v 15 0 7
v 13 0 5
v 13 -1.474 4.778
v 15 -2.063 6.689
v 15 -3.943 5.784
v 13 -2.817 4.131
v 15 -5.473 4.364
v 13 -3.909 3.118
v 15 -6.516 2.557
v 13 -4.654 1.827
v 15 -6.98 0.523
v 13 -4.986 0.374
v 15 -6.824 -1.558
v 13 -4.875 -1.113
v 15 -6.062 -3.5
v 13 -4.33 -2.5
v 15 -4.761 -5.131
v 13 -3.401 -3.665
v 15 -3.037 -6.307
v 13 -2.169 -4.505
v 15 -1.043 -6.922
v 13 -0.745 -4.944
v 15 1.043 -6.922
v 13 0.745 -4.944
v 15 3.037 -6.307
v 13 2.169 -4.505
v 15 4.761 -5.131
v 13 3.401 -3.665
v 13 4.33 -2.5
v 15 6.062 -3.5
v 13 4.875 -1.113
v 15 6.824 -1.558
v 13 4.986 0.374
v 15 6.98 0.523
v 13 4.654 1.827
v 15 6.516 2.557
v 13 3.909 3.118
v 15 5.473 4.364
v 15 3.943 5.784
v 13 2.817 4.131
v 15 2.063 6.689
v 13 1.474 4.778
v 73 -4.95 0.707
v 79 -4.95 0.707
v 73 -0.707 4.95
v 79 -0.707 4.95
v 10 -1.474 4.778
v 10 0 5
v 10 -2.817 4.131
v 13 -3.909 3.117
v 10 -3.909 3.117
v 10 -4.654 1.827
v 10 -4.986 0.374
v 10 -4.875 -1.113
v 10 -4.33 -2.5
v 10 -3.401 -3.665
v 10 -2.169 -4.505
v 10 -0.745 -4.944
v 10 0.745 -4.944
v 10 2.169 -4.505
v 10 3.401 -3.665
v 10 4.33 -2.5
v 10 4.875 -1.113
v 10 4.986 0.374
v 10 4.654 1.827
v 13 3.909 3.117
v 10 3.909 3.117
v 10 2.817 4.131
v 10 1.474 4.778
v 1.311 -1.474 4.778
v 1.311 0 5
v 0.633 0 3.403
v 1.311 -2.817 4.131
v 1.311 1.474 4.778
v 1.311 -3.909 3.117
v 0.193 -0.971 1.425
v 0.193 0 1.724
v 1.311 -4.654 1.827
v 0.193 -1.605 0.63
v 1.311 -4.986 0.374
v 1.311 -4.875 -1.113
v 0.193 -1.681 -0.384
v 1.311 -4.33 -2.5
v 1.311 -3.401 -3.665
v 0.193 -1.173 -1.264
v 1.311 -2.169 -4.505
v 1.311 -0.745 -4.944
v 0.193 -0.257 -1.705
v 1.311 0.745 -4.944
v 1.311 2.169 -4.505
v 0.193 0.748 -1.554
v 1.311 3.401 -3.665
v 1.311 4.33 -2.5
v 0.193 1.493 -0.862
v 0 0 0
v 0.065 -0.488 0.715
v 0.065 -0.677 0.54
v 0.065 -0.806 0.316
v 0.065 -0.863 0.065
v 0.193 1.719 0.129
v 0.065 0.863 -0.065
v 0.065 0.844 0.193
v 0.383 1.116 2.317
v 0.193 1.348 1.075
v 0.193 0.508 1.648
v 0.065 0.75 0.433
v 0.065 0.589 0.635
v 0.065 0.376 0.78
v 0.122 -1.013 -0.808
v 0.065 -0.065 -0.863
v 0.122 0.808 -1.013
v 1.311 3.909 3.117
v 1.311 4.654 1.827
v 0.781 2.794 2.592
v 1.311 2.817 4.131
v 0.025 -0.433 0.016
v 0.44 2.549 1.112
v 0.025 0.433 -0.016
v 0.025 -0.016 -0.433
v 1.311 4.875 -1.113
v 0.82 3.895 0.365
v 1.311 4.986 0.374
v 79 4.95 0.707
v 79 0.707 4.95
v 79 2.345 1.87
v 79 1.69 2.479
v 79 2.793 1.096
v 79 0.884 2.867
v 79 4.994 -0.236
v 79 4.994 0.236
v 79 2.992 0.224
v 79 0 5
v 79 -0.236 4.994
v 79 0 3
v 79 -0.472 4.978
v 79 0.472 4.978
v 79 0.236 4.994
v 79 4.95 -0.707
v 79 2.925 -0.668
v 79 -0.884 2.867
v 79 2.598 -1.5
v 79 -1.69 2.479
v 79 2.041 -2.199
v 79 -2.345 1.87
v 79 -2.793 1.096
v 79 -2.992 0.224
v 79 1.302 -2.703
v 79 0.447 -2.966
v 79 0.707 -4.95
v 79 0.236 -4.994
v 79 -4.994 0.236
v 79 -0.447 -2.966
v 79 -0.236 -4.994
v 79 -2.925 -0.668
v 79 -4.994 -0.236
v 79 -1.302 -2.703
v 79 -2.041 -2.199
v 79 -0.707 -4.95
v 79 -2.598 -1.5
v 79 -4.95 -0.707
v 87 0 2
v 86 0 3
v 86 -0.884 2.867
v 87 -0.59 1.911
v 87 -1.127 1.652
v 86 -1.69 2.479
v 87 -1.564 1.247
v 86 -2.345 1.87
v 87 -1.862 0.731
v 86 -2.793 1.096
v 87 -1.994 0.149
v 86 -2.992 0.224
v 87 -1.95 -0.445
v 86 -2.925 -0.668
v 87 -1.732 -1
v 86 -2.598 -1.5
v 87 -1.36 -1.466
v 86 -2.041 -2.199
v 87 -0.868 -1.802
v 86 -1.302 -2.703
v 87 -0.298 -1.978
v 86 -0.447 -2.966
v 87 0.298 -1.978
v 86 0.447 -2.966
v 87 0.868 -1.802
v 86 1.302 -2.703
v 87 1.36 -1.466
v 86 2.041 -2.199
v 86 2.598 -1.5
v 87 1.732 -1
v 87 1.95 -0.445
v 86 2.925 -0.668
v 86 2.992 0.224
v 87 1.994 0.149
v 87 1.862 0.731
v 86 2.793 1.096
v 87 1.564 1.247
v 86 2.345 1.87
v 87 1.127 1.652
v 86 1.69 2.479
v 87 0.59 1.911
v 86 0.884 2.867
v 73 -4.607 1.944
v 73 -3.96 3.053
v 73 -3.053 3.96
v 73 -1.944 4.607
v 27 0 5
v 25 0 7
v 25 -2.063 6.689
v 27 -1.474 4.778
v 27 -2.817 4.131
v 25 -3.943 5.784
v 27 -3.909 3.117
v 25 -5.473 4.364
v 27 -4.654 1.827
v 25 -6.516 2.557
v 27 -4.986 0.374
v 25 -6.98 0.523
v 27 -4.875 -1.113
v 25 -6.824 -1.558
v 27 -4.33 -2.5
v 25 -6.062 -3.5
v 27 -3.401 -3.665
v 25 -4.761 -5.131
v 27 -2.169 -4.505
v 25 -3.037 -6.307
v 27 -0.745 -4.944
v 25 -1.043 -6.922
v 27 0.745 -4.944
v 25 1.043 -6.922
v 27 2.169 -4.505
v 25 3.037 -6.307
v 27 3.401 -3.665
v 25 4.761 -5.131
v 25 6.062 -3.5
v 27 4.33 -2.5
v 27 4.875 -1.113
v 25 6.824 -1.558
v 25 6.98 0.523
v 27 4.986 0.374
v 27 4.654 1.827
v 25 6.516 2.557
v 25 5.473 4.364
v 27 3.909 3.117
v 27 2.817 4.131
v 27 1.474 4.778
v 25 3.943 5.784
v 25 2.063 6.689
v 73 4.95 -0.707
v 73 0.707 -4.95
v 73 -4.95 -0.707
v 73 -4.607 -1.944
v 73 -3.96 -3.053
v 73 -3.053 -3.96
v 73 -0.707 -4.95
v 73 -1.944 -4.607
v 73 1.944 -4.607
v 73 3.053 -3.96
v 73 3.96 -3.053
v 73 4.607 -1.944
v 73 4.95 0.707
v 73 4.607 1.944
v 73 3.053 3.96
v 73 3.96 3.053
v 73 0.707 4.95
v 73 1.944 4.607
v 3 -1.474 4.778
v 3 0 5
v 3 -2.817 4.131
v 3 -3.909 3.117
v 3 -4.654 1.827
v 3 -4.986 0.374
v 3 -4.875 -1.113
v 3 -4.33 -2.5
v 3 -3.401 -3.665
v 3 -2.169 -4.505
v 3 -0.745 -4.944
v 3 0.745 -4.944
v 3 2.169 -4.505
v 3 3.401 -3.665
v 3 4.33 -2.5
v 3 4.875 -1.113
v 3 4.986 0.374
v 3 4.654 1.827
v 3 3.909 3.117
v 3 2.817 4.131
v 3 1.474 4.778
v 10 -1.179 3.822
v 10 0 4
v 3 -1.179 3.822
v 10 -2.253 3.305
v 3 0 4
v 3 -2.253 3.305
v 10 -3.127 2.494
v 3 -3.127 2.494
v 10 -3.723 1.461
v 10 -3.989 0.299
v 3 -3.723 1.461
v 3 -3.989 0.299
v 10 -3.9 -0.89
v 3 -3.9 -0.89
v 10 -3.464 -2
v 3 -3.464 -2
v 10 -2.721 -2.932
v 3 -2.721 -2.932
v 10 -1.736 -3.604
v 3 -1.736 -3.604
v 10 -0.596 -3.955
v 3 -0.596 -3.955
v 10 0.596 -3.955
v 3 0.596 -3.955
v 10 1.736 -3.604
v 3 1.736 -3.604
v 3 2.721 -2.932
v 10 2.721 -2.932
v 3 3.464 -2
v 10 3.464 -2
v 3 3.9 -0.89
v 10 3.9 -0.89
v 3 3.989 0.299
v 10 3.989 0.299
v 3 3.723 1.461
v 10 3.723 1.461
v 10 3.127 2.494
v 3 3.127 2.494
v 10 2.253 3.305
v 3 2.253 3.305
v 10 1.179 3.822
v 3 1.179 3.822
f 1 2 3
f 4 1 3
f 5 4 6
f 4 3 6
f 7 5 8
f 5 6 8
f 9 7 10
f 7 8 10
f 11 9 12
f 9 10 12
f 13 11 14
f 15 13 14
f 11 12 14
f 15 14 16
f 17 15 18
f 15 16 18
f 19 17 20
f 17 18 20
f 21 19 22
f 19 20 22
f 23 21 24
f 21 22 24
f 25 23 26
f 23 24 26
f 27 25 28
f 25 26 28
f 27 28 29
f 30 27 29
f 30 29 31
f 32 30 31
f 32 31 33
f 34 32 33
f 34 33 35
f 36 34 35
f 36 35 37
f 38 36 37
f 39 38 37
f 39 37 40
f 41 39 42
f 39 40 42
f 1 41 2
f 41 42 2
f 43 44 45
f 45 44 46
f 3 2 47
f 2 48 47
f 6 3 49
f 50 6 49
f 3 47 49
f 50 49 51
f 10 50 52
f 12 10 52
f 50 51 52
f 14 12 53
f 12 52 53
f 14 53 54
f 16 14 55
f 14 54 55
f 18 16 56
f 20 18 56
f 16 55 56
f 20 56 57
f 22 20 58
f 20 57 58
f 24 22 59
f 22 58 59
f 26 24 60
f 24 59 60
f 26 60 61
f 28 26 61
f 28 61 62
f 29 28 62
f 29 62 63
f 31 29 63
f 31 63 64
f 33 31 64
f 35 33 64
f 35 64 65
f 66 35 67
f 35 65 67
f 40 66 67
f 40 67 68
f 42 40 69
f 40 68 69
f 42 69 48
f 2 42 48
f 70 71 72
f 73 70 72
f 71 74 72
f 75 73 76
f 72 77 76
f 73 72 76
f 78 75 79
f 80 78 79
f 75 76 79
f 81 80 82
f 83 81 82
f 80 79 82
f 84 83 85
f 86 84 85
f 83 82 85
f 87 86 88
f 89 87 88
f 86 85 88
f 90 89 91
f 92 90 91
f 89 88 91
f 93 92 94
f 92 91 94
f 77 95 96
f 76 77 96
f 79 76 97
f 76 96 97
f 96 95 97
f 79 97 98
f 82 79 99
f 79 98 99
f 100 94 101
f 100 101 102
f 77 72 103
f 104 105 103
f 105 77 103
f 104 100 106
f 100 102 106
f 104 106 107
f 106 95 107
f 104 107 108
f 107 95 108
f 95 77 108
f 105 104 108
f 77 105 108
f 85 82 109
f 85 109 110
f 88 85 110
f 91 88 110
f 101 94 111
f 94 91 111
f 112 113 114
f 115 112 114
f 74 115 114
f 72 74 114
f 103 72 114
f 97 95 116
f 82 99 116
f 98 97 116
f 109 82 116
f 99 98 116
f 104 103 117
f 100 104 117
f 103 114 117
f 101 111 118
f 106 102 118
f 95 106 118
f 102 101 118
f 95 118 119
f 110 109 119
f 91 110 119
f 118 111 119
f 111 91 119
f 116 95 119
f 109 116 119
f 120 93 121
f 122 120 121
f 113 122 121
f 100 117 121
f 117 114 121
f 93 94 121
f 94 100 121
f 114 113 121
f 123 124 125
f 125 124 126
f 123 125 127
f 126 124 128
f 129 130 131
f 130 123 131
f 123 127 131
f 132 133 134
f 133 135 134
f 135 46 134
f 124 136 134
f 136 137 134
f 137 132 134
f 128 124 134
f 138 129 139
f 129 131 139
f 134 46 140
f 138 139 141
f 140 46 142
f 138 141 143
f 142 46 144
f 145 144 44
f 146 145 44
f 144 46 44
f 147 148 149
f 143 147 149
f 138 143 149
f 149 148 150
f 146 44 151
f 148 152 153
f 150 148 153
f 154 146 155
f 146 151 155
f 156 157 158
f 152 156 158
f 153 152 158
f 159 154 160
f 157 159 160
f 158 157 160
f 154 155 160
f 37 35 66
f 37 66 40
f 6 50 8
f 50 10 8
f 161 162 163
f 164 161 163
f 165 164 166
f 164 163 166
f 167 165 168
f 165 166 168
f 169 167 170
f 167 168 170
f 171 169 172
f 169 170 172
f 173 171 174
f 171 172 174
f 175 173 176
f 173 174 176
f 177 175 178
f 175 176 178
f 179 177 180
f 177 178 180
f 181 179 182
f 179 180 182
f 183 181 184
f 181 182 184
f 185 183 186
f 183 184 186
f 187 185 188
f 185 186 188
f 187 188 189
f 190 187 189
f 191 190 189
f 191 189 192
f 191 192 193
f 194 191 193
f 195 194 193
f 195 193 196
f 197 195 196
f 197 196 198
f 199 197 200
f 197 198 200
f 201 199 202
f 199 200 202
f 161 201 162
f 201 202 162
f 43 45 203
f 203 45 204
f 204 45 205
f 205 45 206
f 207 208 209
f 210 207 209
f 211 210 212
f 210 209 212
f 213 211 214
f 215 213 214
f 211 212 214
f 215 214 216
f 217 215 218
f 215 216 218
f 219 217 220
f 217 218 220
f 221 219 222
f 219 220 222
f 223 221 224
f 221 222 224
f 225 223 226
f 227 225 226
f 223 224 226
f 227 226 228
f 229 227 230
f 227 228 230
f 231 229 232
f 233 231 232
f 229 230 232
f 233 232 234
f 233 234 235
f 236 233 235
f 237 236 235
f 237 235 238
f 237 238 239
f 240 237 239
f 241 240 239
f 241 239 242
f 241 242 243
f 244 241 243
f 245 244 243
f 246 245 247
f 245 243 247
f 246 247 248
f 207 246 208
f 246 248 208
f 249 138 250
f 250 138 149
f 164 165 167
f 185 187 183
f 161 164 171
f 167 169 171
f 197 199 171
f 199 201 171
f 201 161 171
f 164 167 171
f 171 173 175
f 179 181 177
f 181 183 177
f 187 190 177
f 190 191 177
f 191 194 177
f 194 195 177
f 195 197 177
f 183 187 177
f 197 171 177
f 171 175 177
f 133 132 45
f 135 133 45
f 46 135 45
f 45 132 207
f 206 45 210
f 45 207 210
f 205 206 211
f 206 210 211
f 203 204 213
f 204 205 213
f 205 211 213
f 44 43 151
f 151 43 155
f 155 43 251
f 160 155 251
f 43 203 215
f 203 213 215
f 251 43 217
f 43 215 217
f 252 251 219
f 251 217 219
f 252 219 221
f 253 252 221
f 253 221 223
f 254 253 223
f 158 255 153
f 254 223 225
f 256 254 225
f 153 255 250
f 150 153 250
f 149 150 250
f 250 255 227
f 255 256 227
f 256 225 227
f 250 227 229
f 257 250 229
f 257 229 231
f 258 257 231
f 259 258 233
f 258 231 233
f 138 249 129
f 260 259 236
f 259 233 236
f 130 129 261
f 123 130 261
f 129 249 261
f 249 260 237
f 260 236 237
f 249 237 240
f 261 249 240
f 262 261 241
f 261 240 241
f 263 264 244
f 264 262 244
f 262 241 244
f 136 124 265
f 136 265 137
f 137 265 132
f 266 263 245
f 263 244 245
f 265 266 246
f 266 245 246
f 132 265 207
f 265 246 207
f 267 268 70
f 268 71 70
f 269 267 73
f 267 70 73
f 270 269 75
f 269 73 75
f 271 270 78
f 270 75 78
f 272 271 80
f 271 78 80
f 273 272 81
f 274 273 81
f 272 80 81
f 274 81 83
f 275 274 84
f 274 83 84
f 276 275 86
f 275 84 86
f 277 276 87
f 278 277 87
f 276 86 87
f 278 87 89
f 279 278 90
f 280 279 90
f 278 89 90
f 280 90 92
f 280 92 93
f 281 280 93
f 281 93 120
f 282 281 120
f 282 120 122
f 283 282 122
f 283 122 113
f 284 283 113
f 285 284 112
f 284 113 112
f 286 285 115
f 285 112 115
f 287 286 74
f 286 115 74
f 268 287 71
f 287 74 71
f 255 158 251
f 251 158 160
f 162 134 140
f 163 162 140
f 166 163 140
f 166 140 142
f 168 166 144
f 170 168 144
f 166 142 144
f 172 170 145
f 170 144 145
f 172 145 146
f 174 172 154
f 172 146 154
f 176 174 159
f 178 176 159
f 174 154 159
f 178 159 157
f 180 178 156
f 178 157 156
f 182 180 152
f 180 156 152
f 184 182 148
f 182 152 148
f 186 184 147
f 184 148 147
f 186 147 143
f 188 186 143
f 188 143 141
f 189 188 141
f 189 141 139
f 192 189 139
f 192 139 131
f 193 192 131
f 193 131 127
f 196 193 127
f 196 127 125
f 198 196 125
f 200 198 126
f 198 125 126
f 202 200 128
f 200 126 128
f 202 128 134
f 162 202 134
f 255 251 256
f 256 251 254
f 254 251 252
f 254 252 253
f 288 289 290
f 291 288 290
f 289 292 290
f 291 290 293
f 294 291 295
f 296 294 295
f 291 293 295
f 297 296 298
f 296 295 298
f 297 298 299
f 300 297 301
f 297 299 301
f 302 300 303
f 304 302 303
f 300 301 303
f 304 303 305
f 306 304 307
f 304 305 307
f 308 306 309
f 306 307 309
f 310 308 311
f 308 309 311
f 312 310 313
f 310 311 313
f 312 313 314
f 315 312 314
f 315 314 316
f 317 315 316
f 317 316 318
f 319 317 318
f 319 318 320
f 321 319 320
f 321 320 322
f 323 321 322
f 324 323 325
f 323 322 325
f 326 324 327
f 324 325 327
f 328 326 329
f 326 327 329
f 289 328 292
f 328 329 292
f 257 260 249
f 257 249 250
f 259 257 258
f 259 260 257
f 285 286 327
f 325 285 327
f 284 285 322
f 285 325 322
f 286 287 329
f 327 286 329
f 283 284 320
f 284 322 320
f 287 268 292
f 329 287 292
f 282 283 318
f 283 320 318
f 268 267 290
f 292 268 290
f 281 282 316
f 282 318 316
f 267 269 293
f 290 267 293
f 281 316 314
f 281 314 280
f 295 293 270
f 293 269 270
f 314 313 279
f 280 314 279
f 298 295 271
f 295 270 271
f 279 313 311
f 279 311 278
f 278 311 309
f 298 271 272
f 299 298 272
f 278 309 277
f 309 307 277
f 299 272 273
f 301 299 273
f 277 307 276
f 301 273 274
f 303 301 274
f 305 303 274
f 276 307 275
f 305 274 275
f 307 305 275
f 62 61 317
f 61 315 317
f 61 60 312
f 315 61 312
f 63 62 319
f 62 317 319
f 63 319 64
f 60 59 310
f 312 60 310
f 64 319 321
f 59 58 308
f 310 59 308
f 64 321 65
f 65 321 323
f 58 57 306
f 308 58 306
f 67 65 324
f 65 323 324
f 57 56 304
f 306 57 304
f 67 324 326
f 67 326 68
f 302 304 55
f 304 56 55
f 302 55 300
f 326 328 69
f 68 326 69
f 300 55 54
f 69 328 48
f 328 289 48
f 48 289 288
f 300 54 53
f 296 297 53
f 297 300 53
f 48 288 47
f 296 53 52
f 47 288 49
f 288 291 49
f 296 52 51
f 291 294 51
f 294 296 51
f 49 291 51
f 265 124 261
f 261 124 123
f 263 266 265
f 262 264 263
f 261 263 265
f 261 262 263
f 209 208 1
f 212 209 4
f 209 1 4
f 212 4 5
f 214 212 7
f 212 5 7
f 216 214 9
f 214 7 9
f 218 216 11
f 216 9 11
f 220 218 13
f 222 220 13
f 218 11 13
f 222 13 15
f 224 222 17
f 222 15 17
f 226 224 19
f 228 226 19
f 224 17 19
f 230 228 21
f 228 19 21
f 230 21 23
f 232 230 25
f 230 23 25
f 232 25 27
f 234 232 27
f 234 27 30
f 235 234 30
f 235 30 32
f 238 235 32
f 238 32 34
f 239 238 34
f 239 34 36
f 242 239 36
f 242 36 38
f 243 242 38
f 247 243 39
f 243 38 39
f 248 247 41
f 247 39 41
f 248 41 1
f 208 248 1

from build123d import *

# Parameters (mm, degrees)
CHAMFER1_SIZE      = 1
CHAMFER2_SIZE      = 2
SKETCH2_OUTSIDE_W  = 33.844
SKETCH2_OUTSIDE_H  = 33.844
CUT_EXTRUDE1_DEPTH = 6


with BuildPart() as part:
    # Sketch1 → Revolve1 (revolve)
    with BuildSketch(Plane.XY, mode=Mode.PRIVATE) as revolve1_sk:
        with BuildLine():
            Line((87, 0), (87, 3))
            Line((87, 3), (79, 3))
            Line((79, 3), (79, 5))
            Line((79, 5), (25, 5))
            Line((25, 5), (25, 7))
            Line((25, 7), (13, 7))
            Line((13, 7), (13, 5))
            Line((13, 5), (10, 5))
            Line((10, 5), (10, 4))
            Line((10, 4), (3, 4))
            Line((3, 4), (3, 5))
            Line((3, 5), (1.310723572, 5))
            ThreePointArc((1.310723572, 5), (0.382949383, 2.571411472), (0, 0))
            Line((0, 0), (87, 0))
        make_face()
    revolve(revolve1_sk.sketch.rotate(Axis((0, 0, 0), (1, 0, 0)), 90), axis=Axis((0, 0, 0), (1, 0, 0)))

    # Chamfer1
    chamfer1_edges = [part.edges().sort_by_distance(p)[0] for p in [
        (87, 0, -3),
    ]]
    chamfer(chamfer1_edges, length=CHAMFER1_SIZE)

    # Chamfer2
    chamfer2_edges = [part.edges().sort_by_distance(p)[0] for p in [
        (13, 0, -7),
        (25, 0, -5),
    ]]
    chamfer(chamfer2_edges, length=CHAMFER2_SIZE - 0.0001)  # a hair under: the kernel refuses the full size

    # Sketch2 outside → Cut-Extrude1 (cut)
    with BuildSketch(Plane(origin=(79, 0, 0), x_dir=(0, 0, -1), z_dir=(1, 0, 0))):
        Rectangle(SKETCH2_OUTSIDE_W, SKETCH2_OUTSIDE_H)
        Polygon((0, 5.656854249), (5.656854249, 0), (0, -5.656854249), (-5.656854249, 0), align=None, mode=Mode.SUBTRACT)
    extrude(amount=-CUT_EXTRUDE1_DEPTH, mode=Mode.SUBTRACT)


solid = part.part
